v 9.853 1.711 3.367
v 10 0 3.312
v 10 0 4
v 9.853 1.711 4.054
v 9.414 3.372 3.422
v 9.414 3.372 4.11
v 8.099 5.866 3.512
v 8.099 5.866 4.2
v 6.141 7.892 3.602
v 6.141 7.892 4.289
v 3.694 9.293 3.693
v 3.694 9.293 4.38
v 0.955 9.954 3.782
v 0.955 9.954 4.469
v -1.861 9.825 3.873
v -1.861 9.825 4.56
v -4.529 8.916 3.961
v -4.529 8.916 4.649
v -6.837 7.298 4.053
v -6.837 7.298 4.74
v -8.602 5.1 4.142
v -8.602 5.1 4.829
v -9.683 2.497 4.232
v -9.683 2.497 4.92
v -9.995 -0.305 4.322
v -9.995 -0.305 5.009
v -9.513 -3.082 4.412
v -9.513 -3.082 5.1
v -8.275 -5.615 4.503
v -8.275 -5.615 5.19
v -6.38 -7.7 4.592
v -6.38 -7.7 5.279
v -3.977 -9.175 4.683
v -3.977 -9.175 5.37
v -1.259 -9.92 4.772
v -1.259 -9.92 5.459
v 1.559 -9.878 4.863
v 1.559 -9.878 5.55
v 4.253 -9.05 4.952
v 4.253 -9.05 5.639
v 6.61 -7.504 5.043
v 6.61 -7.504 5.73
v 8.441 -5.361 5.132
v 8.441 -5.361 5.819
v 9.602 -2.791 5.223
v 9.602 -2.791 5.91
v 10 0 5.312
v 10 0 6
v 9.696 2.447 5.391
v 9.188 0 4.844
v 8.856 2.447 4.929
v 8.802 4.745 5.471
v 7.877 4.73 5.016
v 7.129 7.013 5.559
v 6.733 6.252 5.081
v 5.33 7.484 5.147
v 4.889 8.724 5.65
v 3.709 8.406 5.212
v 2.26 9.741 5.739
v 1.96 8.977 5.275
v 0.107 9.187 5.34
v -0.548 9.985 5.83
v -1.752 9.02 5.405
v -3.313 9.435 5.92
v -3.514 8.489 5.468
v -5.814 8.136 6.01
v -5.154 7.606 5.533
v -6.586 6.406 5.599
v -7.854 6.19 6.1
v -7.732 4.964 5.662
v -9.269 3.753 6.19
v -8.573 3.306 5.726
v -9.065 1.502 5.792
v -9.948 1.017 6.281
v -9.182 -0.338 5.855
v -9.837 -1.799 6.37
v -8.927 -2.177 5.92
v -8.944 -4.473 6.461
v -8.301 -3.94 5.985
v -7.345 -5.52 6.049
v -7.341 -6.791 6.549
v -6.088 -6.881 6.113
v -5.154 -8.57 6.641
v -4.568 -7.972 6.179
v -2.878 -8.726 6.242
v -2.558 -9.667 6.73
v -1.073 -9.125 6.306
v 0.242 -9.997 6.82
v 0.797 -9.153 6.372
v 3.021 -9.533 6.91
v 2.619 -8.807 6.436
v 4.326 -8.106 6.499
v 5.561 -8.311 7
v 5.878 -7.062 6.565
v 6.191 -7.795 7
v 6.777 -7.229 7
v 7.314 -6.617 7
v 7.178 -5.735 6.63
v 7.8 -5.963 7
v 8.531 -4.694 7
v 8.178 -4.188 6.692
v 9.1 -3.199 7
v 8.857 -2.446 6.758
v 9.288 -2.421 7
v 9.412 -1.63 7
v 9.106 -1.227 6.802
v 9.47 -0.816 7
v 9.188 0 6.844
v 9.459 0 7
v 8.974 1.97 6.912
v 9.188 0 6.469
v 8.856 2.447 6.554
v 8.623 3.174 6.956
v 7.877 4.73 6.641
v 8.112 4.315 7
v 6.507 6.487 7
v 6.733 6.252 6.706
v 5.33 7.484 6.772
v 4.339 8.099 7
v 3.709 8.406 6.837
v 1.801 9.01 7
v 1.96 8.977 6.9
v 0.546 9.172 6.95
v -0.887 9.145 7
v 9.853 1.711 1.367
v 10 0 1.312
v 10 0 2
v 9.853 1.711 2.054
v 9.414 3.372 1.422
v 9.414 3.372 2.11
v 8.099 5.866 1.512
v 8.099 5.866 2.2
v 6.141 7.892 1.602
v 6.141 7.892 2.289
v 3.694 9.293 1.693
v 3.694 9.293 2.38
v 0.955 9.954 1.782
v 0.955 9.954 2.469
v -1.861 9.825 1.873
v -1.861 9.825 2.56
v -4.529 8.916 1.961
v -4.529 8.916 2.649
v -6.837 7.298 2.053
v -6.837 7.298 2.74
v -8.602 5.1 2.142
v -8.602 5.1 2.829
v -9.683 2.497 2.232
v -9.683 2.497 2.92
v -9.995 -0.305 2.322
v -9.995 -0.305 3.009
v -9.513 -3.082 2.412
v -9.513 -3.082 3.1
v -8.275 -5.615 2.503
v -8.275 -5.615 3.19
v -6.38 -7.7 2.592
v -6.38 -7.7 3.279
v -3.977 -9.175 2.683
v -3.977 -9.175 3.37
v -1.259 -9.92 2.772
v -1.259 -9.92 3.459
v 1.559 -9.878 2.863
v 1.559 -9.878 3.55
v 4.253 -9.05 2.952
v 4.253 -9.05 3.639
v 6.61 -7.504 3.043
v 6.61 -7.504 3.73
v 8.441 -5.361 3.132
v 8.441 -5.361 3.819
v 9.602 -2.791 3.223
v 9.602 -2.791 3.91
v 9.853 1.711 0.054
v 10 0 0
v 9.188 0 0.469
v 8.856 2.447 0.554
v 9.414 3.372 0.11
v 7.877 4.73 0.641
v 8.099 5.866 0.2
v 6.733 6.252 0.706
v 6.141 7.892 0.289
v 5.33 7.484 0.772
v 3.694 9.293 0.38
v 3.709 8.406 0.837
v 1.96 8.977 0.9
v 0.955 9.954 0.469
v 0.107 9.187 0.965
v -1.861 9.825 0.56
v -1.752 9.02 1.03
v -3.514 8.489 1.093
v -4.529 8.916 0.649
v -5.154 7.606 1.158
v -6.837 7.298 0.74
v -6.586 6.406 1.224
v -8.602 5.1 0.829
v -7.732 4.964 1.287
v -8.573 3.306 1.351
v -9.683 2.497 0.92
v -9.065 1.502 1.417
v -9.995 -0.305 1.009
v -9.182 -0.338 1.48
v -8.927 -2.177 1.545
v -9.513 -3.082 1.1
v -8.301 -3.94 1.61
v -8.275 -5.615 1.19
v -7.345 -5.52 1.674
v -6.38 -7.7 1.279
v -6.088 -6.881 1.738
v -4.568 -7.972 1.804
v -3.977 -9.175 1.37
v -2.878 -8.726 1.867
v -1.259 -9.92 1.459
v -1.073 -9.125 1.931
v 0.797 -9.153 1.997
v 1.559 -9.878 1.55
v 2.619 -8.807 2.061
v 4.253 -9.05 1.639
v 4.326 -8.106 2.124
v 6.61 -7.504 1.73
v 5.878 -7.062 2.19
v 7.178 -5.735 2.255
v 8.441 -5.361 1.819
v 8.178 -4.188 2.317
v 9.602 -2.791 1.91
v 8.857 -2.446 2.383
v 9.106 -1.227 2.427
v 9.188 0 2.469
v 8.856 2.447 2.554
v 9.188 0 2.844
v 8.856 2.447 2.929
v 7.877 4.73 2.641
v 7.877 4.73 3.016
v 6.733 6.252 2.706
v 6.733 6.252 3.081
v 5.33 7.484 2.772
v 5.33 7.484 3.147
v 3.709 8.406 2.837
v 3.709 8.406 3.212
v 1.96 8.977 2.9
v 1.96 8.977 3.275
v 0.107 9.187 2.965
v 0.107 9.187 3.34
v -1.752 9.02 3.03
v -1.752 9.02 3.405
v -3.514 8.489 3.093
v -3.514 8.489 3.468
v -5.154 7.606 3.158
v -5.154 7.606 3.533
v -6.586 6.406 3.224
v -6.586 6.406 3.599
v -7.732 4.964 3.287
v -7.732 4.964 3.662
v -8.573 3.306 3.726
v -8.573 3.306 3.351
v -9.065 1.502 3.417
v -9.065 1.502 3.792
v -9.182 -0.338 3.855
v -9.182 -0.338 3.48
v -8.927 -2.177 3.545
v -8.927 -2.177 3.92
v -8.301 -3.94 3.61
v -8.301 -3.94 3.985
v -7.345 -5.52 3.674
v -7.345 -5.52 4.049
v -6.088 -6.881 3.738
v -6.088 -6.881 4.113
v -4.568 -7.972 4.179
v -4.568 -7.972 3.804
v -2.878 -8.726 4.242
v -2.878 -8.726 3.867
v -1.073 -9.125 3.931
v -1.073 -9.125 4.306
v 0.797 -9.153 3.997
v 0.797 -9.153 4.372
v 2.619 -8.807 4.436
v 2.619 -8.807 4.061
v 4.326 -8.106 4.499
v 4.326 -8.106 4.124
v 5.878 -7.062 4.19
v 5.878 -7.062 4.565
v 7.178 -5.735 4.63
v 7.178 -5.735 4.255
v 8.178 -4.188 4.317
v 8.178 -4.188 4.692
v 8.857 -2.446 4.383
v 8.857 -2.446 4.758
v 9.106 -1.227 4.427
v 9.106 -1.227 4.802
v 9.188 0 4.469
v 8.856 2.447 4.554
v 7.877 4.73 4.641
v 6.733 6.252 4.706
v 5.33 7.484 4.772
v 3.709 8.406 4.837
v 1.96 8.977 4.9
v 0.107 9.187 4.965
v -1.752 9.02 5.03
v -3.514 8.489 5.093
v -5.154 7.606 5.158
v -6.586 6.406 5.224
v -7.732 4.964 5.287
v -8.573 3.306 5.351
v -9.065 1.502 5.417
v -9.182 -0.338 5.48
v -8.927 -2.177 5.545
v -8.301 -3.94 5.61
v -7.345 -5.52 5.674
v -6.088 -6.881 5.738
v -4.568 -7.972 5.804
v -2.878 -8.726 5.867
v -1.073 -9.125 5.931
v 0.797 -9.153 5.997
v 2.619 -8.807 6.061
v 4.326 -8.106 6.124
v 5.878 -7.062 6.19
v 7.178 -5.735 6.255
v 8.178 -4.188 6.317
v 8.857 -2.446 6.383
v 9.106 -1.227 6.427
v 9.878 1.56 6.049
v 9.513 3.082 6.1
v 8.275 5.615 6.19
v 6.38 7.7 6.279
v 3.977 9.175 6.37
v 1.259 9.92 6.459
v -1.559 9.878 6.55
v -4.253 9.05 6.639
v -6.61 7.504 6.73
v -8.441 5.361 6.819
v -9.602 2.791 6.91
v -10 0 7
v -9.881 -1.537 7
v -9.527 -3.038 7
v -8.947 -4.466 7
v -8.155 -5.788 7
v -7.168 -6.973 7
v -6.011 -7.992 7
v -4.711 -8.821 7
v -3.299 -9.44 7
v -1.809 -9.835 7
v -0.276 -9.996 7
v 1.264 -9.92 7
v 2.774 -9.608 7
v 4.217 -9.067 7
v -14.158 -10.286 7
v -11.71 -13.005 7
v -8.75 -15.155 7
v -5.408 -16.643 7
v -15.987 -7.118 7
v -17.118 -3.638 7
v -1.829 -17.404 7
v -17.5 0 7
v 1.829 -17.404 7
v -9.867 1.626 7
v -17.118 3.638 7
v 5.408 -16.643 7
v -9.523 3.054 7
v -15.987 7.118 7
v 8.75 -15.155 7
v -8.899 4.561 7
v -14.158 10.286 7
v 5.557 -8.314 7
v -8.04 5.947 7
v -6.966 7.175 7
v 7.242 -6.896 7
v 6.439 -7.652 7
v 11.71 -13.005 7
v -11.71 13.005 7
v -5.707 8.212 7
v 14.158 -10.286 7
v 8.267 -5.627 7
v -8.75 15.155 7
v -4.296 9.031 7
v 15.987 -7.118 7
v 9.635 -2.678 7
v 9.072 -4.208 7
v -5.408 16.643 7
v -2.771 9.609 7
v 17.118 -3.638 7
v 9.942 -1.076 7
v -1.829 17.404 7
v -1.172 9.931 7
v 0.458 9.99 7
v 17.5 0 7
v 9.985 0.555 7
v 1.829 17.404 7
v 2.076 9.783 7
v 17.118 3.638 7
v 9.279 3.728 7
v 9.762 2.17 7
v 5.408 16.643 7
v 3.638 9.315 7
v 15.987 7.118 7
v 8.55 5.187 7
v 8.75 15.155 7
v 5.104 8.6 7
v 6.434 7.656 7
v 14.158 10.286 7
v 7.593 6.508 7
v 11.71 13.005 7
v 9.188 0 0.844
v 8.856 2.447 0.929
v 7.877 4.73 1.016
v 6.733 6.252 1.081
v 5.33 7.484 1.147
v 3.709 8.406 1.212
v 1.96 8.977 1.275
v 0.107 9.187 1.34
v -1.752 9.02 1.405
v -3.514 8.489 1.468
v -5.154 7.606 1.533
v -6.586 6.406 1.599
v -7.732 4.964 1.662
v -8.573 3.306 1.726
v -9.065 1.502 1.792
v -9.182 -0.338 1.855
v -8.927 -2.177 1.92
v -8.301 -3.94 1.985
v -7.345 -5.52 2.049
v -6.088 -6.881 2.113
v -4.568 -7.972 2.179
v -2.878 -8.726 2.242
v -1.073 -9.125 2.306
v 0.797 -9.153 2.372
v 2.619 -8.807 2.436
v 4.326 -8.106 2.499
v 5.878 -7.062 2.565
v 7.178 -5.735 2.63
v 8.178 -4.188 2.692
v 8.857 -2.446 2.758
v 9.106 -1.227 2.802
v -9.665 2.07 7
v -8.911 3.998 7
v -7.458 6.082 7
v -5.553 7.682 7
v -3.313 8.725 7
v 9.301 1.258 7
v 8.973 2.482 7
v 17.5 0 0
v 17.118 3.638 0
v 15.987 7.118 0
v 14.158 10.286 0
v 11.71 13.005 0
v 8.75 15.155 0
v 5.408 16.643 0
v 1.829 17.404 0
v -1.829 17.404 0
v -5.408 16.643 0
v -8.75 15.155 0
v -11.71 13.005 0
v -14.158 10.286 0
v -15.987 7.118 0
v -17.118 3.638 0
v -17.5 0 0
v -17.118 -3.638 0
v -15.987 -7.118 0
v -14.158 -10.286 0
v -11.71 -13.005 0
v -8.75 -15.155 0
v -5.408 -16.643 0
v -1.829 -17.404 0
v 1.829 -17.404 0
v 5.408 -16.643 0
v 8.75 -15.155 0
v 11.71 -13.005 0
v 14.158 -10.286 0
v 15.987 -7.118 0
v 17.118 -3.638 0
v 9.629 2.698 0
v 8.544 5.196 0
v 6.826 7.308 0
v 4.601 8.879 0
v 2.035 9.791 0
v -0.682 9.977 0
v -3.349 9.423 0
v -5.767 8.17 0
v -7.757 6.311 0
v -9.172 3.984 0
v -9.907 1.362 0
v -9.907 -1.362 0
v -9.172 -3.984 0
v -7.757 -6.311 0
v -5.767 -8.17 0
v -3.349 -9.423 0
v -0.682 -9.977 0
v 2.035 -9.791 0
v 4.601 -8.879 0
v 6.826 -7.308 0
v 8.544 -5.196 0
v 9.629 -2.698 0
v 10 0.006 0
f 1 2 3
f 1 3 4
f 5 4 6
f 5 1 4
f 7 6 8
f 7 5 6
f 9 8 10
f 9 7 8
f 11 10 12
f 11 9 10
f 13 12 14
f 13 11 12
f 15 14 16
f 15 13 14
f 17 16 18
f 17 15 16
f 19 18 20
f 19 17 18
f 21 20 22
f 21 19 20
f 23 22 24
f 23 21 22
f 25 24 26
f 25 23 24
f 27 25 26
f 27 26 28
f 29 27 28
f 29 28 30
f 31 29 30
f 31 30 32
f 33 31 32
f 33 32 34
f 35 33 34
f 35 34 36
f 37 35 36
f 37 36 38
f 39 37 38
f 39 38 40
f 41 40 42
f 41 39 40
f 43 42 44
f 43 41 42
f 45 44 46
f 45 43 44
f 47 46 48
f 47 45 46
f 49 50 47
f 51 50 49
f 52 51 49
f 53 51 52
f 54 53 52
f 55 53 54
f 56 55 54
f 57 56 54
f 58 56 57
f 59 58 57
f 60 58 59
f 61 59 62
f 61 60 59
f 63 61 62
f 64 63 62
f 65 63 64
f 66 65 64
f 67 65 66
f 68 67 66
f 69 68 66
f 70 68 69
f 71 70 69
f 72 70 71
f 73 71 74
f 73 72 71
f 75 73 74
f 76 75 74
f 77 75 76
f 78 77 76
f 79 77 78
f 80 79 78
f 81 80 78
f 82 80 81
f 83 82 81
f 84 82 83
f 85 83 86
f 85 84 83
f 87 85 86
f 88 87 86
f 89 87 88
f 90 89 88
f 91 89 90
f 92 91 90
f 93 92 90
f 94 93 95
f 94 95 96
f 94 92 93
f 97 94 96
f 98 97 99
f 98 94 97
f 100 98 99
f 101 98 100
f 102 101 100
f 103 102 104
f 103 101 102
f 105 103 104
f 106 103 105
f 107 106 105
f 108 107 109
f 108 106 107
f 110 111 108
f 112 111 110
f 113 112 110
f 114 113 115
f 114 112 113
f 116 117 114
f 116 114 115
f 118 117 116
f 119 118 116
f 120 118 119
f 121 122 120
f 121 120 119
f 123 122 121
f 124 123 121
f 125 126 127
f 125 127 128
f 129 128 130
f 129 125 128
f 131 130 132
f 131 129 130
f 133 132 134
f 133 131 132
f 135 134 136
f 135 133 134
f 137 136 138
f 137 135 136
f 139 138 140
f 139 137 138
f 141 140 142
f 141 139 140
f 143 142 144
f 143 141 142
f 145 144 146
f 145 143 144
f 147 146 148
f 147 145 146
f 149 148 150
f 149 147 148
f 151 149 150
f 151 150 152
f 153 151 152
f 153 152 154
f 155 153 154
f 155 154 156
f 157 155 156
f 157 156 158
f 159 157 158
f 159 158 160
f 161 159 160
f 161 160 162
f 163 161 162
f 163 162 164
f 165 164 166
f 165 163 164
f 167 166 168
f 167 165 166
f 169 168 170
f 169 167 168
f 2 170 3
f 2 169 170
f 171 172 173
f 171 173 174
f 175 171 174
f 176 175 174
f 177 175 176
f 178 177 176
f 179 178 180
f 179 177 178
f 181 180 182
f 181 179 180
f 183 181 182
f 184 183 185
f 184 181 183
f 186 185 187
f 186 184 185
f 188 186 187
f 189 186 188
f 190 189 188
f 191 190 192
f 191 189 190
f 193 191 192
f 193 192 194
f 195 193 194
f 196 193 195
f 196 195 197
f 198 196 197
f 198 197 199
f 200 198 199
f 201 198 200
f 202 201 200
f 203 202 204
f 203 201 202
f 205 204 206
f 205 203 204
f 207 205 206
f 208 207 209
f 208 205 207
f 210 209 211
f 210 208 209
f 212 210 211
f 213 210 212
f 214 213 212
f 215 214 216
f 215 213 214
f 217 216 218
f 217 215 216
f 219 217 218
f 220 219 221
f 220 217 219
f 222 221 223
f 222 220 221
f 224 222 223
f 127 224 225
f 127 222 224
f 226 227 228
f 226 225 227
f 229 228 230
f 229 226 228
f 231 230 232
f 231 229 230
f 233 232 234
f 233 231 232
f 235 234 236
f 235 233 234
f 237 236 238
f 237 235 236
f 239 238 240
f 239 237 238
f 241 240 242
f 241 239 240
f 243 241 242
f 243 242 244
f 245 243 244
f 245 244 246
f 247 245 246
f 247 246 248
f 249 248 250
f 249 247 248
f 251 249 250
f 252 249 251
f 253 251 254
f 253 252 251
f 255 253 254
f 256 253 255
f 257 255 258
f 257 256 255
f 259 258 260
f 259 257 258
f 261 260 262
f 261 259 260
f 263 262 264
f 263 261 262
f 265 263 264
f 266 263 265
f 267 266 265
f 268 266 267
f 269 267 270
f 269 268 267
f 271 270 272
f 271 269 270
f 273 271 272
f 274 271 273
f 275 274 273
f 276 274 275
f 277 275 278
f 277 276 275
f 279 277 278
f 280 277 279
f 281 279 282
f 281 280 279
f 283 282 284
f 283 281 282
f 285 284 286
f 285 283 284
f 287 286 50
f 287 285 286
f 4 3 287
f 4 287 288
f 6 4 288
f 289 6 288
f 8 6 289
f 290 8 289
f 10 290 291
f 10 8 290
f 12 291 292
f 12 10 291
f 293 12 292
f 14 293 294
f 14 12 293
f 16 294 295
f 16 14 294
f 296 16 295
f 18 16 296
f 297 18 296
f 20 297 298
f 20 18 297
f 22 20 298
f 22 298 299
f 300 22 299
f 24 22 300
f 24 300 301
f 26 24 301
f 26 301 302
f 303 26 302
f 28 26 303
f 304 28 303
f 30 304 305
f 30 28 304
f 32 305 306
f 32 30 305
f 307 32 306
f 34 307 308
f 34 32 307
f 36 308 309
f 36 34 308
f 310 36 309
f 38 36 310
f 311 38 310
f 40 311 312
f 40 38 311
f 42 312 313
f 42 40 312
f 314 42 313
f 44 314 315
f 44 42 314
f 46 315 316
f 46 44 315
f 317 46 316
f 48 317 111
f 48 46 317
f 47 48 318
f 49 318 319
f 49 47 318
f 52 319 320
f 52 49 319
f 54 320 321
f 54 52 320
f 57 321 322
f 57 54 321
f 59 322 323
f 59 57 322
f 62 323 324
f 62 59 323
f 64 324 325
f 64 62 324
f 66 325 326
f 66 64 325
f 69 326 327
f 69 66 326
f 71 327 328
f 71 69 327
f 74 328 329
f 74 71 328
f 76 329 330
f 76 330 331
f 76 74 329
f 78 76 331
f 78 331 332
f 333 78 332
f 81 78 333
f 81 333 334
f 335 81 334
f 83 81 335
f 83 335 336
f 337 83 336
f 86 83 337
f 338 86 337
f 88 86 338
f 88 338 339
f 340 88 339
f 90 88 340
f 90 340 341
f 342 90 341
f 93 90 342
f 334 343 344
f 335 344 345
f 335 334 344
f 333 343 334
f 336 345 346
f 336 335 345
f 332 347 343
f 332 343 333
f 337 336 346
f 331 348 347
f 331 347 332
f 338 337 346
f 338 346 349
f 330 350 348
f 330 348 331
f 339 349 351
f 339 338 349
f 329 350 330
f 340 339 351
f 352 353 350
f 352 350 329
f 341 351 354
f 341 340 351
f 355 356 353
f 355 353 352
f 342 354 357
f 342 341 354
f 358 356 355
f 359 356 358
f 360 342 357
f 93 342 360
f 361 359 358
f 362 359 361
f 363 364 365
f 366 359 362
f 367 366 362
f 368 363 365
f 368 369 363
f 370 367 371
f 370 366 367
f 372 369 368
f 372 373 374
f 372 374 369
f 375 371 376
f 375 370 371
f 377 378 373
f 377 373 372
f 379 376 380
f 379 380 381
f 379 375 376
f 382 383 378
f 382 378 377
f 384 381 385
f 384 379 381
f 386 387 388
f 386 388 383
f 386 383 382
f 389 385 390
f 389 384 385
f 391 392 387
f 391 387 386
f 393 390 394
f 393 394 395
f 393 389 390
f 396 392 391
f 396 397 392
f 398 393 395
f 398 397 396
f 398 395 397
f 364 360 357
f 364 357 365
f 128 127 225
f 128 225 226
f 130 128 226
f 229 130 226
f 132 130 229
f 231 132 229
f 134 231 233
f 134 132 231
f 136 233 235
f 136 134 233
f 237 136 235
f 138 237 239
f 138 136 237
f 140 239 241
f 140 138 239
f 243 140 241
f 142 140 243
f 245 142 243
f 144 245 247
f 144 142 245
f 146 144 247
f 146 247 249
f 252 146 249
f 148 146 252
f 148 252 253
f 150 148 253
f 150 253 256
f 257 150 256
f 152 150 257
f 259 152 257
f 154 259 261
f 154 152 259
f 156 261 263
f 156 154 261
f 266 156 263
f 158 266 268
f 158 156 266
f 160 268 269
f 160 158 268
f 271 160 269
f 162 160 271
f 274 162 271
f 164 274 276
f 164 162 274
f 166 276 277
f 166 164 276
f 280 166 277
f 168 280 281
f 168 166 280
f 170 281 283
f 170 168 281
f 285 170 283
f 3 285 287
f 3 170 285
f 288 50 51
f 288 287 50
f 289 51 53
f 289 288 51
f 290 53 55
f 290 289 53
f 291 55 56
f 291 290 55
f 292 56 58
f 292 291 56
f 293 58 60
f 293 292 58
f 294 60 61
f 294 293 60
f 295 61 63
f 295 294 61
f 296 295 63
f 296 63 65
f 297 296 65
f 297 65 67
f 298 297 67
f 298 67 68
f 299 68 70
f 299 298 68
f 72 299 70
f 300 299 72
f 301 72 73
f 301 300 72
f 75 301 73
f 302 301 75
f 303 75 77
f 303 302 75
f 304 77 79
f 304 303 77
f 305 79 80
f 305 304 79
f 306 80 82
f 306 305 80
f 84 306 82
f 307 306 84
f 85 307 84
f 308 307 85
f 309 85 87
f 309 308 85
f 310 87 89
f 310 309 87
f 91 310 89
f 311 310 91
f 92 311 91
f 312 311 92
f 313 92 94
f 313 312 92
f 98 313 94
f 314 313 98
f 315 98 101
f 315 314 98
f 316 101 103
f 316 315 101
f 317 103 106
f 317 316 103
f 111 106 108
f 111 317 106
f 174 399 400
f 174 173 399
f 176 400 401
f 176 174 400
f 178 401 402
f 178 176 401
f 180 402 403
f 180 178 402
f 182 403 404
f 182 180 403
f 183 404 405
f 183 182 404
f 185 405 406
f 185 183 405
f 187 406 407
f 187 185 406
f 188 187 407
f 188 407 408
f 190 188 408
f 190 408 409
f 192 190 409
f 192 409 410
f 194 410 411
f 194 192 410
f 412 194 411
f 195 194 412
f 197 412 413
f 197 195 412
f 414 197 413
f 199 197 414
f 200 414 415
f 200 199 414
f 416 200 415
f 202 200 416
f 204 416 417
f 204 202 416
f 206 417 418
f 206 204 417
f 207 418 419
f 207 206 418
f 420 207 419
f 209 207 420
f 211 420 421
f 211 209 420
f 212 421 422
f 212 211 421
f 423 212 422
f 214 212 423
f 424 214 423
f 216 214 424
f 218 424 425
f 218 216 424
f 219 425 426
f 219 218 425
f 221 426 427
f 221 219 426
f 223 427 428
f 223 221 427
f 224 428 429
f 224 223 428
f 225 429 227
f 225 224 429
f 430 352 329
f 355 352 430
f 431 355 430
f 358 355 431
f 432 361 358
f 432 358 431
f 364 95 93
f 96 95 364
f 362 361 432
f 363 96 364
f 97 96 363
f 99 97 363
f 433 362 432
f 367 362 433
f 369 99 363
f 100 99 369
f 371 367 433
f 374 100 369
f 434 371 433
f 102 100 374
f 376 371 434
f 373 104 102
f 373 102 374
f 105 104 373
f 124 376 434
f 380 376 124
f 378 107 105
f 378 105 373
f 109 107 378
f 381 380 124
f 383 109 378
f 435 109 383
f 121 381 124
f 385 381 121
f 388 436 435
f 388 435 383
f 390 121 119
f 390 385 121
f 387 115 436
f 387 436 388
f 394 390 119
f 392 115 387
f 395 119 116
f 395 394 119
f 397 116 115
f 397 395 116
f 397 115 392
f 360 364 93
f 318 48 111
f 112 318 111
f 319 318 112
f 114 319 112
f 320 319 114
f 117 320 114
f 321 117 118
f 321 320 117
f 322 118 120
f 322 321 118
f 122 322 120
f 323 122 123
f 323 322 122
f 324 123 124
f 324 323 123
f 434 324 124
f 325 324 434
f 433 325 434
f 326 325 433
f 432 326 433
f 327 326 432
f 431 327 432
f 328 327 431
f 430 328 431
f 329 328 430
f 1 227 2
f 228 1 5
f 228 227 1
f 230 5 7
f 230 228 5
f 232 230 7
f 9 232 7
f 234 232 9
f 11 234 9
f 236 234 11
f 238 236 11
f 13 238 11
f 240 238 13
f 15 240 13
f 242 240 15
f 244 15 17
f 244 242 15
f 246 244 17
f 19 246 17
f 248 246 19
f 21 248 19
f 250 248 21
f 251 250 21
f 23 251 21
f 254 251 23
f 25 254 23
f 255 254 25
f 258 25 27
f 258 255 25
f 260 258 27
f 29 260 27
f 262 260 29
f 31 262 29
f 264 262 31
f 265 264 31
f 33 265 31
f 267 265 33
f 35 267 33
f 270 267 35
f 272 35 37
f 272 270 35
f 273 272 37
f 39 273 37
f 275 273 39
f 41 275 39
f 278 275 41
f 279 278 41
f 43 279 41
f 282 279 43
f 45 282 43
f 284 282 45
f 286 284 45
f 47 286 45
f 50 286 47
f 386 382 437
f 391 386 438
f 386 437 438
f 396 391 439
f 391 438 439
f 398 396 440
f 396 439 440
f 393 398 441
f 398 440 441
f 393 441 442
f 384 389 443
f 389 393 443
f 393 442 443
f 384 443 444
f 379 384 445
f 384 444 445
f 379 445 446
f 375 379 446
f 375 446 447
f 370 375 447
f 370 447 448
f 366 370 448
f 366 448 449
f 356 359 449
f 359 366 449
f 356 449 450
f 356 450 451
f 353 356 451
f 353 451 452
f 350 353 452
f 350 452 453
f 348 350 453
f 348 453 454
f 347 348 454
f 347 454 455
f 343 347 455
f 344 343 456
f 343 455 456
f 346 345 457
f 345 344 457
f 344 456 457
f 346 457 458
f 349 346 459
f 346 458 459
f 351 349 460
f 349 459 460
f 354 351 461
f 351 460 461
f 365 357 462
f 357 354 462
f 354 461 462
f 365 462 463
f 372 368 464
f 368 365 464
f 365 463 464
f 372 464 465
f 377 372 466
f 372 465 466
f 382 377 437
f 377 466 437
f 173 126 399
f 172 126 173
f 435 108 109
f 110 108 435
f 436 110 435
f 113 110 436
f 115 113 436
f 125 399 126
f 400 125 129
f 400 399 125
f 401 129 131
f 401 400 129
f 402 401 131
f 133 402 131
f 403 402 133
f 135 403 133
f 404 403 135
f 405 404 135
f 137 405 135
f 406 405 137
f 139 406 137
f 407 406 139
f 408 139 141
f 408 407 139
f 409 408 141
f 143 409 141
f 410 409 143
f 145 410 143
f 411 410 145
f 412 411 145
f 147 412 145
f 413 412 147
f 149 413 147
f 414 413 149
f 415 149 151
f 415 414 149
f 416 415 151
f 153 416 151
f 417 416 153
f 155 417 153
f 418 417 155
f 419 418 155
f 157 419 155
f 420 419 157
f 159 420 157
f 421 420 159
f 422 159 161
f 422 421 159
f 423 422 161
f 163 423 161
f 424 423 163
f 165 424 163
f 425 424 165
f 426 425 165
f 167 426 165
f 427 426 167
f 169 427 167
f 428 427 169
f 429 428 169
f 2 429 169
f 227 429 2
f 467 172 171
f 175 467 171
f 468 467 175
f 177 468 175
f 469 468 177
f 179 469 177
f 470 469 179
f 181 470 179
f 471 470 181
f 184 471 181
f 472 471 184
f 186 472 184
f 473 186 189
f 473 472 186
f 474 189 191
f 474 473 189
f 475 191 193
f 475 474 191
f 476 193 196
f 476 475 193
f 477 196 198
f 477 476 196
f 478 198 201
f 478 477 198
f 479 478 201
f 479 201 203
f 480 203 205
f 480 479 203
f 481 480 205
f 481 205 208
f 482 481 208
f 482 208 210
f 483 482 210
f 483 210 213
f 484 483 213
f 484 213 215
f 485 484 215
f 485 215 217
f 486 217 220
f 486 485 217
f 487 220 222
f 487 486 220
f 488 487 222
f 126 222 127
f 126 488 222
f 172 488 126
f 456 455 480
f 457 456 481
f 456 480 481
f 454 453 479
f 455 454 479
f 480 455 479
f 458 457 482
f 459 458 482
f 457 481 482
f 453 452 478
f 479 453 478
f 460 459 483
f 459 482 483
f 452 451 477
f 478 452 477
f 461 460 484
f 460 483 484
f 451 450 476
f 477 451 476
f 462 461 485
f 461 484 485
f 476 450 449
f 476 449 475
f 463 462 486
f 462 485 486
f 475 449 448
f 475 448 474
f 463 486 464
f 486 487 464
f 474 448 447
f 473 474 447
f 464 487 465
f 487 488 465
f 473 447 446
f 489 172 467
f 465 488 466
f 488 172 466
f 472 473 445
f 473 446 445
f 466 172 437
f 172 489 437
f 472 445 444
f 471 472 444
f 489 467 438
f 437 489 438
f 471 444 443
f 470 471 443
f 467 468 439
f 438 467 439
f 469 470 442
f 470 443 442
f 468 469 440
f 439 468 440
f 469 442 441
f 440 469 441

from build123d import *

# Parameters (mm, degrees)
SKETCH1_R           = 17.5
SKETCH1_R_2         = 10
BOSS_EXTRUDE1_DEPTH = 7
THREAD1_PITCH       = 2
SKETCH4_W           = 35
SKETCH4_H           = 2.231433202
CUT_EXTRUDE1_DEPTH  = 28.5


with BuildPart() as part:
    # Sketch1 → Boss-Extrude1 (new body)
    with BuildSketch(Plane.XY):
        Circle(SKETCH1_R)
        Circle(SKETCH1_R_2, mode=Mode.SUBTRACT)
    extrude(amount=BOSS_EXTRUDE1_DEPTH)

    # Thread1: the profile of Thread Profile1 profile screwed along a right-hand helix of 3.5 turns, 10 arcs to a turn; built about Z, then put on its axis
    thread1_z = Axis((0, 0, 0), (0, 0, 1))
    thread1_corners = [(10.0003, 0, -0.000173205), (10.0003, 0, 1.312673201), (9.188101187, 0, 0.843749998), (9.188101187, 0, 0.468749998)]
    with BuildLine(mode=Mode.PRIVATE) as thread1_profile:
        Line(thread1_corners[0], thread1_corners[1])
        Line(thread1_corners[1], thread1_corners[2])
        Line(thread1_corners[2], thread1_corners[3])
        Line(thread1_corners[3], thread1_corners[0])
    thread1_cap = Face(thread1_profile.wire())
    thread1_turn_angles = [0, 18, 36, 54, 72, 90, 108, 126, 144, 162, 180, 198, 216, 234, 252, 270, 288, 306, 324, 342, 360]
    thread1_turn_weights = [1, 0.9510565162951535, 1, 0.9510565162951535, 1, 0.9510565162951535, 1, 0.9510565162951535, 1, 0.9510565162951535, 1, 0.9510565162951535, 1, 0.9510565162951535, 1, 0.9510565162951535, 1, 0.9510565162951535, 1, 0.9510565162951535, 1]
    thread1_turn_rails = [Edge.make_bspline([Vector(p[0], p[1], 0).rotate(thread1_z, thread1_turn_angles[k]) / thread1_turn_weights[k] + Vector(0, 0, p[2] + THREAD1_PITCH * thread1_turn_angles[k] / 360) for k in range(21)], [0, 0, 0, 1, 1, 2, 2, 3, 3, 4, 4, 5, 5, 6, 6, 7, 7, 8, 8, 9, 9, 10, 10, 10], 2, thread1_turn_weights) for p in thread1_corners]
    thread1_turn_sides = [Face.make_surface_from_curves(thread1_turn_rails[p[0]], thread1_turn_rails[p[1]]) for p in [(0, 1), (1, 2), (2, 3), (3, 0)]]
    thread1_last_angles = [1080, 1098, 1116, 1134, 1152, 1170, 1188, 1206, 1224, 1242, 1260]
    thread1_last_weights = [1, 0.9510565162951535, 1, 0.9510565162951535, 1, 0.9510565162951535, 1, 0.9510565162951535, 1, 0.9510565162951535, 1]
    thread1_last_rails = [Edge.make_bspline([Vector(p[0], p[1], 0).rotate(thread1_z, thread1_last_angles[k]) / thread1_last_weights[k] + Vector(0, 0, p[2] + THREAD1_PITCH * thread1_last_angles[k] / 360) for k in range(11)], [0, 0, 0, 1, 1, 2, 2, 3, 3, 4, 4, 5, 5, 5], 2, thread1_last_weights) for p in thread1_corners]
    thread1_last_sides = [Face.make_surface_from_curves(thread1_last_rails[p[0]], thread1_last_rails[p[1]]) for p in [(0, 1), (1, 2), (2, 3), (3, 0)]]
    thread1 = Plane(origin=(0, 0, 0), x_dir=(1, 0, 0), z_dir=(0, 0, 1)) * Solid(Shell([*[p.moved(Location((0, 0, THREAD1_PITCH * i))) for i in range(3) for p in thread1_turn_sides], *thread1_last_sides, thread1_cap, thread1_cap.rotate(thread1_z, 1260).moved(Location((0, 0, THREAD1_PITCH * 1260 / 360)))]))
    add(thread1)

    # Sketch4 → Cut-Extrude1 (cut, symmetric)
    with BuildSketch(Plane(origin=(0, 0, 0), x_dir=(1, 0, 0), z_dir=(0, 1, 0))):
        with Locations((0, -8.115716601)):
            Rectangle(SKETCH4_W, SKETCH4_H)
    extrude(amount=CUT_EXTRUDE1_DEPTH, both=True, mode=Mode.SUBTRACT)


solid = part.part
